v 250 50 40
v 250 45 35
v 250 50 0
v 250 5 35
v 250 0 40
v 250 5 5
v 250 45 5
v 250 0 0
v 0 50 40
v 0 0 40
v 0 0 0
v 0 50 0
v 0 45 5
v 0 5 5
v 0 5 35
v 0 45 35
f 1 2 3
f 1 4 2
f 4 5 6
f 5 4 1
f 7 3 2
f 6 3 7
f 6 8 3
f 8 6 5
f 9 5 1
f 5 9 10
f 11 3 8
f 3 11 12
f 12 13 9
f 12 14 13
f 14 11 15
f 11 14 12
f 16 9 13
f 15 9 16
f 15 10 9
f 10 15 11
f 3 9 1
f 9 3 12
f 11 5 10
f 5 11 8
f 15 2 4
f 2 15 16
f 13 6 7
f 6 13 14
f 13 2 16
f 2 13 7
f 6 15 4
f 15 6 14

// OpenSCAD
$fn = 32;

// ----------------------------------------------------------------------
// Box beam: 200-250 mm hollow beam
// ----------------------------------------------------------------------

// --- parameters (mm) ---
beam_l = 250;             // beam length, X
beam_w = 50;              // beam width, Y
beam_h = 40;              // beam height, Z
wall = 5;                 // wall thickness

difference() {
  cube([beam_l, beam_w, beam_h]);
  translate([-1, wall, wall])
    cube([beam_l + 2, beam_w - 2 * wall, beam_h - 2 * wall]);
}
